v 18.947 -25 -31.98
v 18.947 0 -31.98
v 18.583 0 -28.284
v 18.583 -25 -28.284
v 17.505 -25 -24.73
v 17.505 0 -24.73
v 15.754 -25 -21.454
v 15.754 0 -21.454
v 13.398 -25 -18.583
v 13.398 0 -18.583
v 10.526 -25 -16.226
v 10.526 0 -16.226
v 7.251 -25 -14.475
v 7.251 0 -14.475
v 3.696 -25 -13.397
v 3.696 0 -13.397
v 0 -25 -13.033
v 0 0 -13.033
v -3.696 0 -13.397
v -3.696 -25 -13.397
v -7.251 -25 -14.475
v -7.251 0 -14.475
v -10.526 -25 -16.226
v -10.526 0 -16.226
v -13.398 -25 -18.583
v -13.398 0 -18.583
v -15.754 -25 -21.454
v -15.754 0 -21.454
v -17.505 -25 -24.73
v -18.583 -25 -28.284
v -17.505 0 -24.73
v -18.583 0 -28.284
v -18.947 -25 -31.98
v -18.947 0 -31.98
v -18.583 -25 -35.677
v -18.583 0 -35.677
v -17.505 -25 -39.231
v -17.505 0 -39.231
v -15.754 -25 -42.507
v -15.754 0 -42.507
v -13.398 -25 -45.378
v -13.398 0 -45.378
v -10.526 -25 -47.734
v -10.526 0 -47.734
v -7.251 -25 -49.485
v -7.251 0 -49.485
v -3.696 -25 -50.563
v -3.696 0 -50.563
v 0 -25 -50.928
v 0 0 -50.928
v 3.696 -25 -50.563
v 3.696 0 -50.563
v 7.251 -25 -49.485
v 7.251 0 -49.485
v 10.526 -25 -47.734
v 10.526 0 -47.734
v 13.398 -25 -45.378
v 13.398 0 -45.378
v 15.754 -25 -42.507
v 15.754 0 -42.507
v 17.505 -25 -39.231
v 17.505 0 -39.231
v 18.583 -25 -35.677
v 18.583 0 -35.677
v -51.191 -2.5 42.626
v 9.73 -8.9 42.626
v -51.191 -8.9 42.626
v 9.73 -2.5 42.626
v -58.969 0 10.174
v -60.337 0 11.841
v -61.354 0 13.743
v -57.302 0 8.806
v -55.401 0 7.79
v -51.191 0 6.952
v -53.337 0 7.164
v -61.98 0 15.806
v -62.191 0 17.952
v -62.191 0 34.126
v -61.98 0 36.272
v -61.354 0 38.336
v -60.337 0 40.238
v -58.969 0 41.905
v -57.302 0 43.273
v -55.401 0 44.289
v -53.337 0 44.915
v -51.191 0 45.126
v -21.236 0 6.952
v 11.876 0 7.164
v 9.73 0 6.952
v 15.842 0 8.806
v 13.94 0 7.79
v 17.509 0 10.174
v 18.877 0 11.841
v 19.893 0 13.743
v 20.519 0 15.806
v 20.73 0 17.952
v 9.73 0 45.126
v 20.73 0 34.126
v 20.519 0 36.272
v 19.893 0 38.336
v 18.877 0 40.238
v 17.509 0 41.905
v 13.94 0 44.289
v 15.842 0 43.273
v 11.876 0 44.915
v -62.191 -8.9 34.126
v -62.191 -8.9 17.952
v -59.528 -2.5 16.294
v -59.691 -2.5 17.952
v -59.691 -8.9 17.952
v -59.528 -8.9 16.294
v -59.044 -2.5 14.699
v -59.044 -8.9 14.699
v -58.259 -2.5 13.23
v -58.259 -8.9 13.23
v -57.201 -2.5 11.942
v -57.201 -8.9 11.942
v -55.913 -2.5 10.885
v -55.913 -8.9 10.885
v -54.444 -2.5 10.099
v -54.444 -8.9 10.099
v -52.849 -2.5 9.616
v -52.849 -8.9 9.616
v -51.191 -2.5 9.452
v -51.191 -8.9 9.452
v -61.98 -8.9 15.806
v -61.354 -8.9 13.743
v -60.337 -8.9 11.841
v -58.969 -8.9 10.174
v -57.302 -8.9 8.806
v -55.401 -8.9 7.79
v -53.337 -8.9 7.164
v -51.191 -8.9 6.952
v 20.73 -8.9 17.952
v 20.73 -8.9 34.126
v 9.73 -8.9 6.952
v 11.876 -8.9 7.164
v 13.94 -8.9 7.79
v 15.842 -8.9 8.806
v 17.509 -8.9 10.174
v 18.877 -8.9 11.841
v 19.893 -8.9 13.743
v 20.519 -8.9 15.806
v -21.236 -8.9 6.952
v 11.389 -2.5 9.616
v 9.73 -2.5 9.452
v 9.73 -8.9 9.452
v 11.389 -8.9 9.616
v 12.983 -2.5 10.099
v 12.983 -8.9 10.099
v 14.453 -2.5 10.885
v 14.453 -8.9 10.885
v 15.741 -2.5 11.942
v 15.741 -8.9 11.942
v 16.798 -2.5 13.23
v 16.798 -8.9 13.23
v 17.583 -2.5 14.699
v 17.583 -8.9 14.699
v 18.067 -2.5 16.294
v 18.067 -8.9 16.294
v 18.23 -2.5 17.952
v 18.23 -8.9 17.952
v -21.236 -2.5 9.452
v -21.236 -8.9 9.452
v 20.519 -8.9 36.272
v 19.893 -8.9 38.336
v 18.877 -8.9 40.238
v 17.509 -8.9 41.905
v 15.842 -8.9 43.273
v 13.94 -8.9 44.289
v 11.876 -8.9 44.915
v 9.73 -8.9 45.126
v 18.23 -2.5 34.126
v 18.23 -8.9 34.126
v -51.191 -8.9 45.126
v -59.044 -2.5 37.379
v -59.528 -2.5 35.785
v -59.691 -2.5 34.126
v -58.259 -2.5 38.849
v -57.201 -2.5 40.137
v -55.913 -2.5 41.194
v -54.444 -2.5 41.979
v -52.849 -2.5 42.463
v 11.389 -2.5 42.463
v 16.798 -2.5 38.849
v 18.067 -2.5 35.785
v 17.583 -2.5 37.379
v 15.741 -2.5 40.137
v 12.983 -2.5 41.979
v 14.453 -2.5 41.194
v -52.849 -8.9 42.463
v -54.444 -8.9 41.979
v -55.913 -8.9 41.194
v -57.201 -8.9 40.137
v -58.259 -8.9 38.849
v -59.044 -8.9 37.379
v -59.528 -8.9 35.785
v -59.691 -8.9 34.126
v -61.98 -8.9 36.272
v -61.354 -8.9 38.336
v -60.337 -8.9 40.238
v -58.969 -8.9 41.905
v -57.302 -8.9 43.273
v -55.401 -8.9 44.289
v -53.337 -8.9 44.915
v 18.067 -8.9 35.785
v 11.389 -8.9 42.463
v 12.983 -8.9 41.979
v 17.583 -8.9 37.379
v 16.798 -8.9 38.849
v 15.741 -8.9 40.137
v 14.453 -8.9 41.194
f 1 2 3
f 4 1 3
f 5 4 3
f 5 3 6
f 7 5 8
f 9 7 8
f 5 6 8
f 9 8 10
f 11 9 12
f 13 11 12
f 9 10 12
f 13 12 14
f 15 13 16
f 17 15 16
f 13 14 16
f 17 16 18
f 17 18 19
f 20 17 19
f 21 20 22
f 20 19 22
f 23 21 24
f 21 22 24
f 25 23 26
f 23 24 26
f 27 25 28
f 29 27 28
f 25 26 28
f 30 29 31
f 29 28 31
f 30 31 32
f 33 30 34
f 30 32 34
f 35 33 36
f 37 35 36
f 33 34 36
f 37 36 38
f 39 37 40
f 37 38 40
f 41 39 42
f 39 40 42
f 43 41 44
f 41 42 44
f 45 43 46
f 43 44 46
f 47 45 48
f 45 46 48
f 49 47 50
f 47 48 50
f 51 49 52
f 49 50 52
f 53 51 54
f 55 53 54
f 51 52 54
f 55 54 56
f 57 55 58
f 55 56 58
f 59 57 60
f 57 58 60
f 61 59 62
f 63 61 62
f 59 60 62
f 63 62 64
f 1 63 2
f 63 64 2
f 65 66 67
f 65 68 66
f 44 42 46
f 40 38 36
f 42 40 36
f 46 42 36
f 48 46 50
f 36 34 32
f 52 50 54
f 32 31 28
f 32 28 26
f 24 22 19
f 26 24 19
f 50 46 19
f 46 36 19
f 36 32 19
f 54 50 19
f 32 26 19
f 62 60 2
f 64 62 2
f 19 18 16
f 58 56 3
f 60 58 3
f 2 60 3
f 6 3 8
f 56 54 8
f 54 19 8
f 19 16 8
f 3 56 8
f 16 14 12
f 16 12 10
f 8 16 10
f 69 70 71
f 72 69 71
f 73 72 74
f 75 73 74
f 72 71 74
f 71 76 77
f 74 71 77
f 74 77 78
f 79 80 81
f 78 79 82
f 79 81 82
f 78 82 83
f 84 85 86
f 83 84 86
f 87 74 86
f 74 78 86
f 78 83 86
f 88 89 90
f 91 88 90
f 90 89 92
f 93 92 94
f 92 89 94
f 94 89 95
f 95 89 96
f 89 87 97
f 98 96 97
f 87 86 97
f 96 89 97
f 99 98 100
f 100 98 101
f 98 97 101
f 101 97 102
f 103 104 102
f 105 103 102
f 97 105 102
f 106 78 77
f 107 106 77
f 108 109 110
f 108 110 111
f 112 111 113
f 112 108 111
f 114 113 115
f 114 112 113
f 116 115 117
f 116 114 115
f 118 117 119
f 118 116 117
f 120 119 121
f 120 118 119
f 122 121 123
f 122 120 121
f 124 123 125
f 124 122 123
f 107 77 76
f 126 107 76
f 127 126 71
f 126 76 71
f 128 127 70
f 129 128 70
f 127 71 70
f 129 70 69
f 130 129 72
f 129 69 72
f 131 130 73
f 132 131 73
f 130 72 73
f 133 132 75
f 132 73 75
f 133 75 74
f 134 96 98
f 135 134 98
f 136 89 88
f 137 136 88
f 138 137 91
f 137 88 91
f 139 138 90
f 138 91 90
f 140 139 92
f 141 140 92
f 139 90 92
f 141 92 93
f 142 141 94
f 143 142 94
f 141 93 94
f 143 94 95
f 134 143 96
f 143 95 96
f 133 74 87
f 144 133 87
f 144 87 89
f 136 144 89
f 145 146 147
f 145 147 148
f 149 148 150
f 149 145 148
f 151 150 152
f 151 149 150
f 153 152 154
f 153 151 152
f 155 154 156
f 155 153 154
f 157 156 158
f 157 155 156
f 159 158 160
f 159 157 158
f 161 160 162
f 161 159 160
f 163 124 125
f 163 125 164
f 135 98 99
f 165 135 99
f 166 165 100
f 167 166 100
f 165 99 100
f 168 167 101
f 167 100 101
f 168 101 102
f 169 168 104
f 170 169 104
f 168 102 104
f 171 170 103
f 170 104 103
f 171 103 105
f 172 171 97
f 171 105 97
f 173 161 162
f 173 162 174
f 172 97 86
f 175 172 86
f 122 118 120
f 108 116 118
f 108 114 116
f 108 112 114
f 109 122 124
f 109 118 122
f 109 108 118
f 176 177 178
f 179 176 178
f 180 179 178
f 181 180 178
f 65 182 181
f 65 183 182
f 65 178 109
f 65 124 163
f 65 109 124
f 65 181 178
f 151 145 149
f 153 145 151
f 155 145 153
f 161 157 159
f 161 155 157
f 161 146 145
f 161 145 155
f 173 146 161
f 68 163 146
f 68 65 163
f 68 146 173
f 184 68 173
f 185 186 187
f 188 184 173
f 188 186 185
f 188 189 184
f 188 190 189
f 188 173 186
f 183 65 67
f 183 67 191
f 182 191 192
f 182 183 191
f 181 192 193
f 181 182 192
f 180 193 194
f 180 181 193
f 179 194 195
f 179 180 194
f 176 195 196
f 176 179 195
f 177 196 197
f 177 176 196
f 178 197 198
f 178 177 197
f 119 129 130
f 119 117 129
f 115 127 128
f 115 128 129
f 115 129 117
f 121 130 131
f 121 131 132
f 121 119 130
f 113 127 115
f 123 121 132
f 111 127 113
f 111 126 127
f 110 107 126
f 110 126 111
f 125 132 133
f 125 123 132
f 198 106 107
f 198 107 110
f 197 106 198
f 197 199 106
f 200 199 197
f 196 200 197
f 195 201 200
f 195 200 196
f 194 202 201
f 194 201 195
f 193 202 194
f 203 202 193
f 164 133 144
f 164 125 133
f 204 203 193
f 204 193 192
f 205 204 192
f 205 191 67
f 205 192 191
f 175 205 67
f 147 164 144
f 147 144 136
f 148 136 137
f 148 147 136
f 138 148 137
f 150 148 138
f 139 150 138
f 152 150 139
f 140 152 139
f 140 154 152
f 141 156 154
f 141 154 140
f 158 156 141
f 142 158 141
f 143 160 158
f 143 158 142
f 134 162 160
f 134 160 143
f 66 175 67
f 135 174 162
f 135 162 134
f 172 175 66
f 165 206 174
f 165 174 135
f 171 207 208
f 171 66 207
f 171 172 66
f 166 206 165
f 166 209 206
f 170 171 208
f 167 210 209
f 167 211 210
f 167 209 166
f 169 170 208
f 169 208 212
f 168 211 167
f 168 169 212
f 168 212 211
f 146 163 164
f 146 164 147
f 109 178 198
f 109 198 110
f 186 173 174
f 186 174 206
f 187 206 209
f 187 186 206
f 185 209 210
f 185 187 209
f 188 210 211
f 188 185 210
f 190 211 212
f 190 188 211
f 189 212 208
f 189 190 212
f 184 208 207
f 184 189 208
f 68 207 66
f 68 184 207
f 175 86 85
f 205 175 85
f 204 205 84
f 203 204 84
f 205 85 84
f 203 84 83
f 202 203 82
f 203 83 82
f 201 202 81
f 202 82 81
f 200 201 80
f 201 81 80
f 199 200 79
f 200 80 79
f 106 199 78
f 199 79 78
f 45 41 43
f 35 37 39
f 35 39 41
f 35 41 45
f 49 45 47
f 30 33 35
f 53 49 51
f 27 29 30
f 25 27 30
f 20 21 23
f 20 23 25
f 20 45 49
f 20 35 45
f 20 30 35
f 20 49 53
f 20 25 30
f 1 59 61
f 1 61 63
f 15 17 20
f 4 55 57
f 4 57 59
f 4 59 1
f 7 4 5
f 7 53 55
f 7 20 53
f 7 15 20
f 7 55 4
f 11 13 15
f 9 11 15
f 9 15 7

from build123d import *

# Parameters (mm, degrees)
F1_DEPTH = 8.9
F2_T     = -2.5
F3_R     = 18.9471893283
F4_DEPTH = 25


# Not quite as in the source:
# - ends of sketch curves that miss each other by under 0.0002 mm in the source are joined


with BuildPart() as f1:
    # F0 (on Front) → F1 (new body)
    with BuildSketch(Plane.XZ):
        with BuildLine():
            Line((-21.2359558791, 45.1264046133), (-51.1910132468, 45.1264046133))
            ThreePointArc((-51.1910132468, 45.1264046133), (-58.9691878398, 41.9045792063), (-62.1910132468, 34.1264046133))
            Line((-62.1910132468, 34.1264046133), (-62.1910132468, 17.9522452541))
            ThreePointArc((-62.1910132468, 17.9522452541), (-58.9691878398, 10.174070661), (-51.1910132468, 6.9522452541))
            Line((-51.1910132468, 6.9522452541), (-21.2359558791, 6.9522452541))
            Line((-21.2359558791, 6.9522452541), (9.7303389907, 6.952248048))
            ThreePointArc((9.7303389907, 6.952248048), (17.5085135837, 10.174073455), (20.7303389907, 17.952248048))
            Line((20.7303389907, 17.952248048), (20.7303389907, 34.1264046133))
            ThreePointArc((20.7303389907, 34.1264046133), (17.5085135837, 41.9045792063), (9.7303389907, 45.1264046133))
            Line((9.7303389907, 45.1264046133), (-21.2359558791, 45.1264046133))
        make_face()
    extrude(amount=F1_DEPTH)

    # F2
    f2_openings = [f1.faces().sort_by_distance(p)[0] for p in [
        (-20.730338, -8.9, 26.039325),
    ]]
    offset(amount=F2_T, openings=f2_openings)


with BuildPart() as f4:
    # F3 (on Front) → F4 (new body)
    with BuildSketch(Plane.XZ):
        with Locations((0, -31.9803394377)):
            Circle(F3_R)
    extrude(amount=F4_DEPTH)


solid = Compound([f1.part, f4.part])
